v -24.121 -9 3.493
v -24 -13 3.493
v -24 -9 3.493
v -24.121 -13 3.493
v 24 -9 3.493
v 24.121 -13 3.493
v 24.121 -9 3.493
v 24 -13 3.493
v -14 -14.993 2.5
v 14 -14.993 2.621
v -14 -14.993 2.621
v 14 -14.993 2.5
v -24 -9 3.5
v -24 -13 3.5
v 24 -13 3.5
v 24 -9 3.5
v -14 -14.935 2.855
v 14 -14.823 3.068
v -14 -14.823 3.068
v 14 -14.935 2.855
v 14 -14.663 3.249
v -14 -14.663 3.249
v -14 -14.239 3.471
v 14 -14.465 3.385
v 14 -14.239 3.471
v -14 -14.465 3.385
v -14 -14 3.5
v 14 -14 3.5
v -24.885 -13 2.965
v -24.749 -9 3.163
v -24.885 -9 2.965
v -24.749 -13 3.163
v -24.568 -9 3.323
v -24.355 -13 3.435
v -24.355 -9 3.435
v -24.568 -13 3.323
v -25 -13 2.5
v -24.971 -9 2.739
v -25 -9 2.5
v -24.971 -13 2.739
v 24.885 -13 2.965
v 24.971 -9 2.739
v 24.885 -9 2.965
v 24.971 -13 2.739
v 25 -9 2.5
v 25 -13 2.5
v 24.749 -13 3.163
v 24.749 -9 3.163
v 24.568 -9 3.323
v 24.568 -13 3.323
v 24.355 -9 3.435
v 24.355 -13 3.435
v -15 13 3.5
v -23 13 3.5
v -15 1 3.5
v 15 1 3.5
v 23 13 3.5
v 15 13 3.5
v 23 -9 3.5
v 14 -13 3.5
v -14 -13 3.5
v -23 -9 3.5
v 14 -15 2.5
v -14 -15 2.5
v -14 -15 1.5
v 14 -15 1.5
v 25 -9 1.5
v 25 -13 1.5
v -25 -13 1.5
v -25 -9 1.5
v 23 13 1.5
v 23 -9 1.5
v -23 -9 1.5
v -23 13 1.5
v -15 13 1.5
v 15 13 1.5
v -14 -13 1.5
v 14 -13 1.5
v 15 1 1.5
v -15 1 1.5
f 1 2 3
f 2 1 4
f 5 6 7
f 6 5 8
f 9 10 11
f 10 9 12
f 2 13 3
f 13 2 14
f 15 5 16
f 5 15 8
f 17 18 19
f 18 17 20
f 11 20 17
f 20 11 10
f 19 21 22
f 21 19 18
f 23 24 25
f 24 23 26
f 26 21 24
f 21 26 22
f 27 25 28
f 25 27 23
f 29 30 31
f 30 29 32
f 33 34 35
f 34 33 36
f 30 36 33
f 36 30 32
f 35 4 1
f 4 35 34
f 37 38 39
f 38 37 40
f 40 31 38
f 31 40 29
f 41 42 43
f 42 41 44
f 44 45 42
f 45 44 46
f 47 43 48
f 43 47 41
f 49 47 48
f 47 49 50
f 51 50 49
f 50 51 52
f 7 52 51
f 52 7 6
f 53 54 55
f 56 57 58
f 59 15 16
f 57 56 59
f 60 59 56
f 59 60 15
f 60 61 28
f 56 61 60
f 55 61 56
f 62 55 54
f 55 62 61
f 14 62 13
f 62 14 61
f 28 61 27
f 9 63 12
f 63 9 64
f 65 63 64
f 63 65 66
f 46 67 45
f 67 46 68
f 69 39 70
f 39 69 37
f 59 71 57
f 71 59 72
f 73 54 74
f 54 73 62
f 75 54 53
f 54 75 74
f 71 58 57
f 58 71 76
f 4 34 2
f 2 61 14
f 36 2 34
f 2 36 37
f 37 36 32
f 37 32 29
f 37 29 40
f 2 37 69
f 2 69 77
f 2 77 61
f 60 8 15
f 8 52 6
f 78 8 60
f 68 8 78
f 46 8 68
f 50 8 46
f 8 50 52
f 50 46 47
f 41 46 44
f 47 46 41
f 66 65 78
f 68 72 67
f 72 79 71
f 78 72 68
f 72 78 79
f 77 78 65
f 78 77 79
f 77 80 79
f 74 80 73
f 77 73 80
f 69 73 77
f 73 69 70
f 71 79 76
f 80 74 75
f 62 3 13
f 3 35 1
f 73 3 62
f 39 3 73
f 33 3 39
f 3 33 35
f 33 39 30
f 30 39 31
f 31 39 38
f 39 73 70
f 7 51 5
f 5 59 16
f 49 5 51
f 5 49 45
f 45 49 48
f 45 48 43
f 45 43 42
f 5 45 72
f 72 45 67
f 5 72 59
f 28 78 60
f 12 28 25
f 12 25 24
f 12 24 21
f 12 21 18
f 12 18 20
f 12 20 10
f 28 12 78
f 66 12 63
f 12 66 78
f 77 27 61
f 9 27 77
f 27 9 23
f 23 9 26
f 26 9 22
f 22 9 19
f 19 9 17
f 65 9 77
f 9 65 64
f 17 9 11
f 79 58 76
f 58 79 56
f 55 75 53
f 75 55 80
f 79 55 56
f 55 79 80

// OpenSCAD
// file: holder_hole.scad
module holder_hole(
    width = 50,
    deep = 30,
    height = 7,
    wall = 2,
    hole_length = 20,
    cover_mortize_length = 4,
    gap = 5
){
    union(){
    
        translate([-width/2+wall+gap/2,-deep/2+wall+gap/2,-height/2+wall]){
            cube([width-2*wall-gap,deep-2*wall-gap,2*height],center=false);
        }
        
        translate([-hole_length/2+gap/2,-deep,-height/2+wall]){
            cube([hole_length-gap,deep,2*height],center=false);
        }
        
        translate([-width,-deep/2+wall+gap/2,height/2-wall]){
            cube([width*2,cover_mortize_length-gap,wall*2],center=false);
        }
        
        cvr_bottom_mortize_len = hole_length + cover_mortize_length*2;
        translate([-cvr_bottom_mortize_len/2+gap/2,-deep/2-wall/2,height/2-wall]){
            cube([cvr_bottom_mortize_len-gap,wall*2,wall*2],center=false);
        }
    }
}

holder_hole(gap=2);
%holder_hole(gap=0);
// file: round_cube.scad
module round_cube(sizes, radius){
    
    union(){
        for(xd = [-1,1]){
        for(yd = [-1,1]){
        for(zd = [-1,1]){
            translate([
                (sizes[0]/2 - radius)*xd,
                (sizes[1]/2 - radius)*yd,
                (sizes[2]/2 - radius)*zd]
            ){
                sphere(radius, $fs=0.25);
            }
        }}}
        cube([sizes[0]-radius*2,sizes[1]-radius*2,sizes[2]], center=true);
        cube([sizes[0]-radius*2,sizes[1],sizes[2]-radius*2], center=true);
        cube([sizes[0],sizes[1]-radius*2,sizes[2]-radius*2], center=true);
    
        for(d1 = [-1,1]){
        for(d2 = [-1,1]){        
            translate([
                (sizes[0]/2-radius)*d1,
                (sizes[1]/2-radius)*d2,
                0
            ]){
                cylinder(h=sizes[2]-radius*2, r=radius, center=true, $fs=0.25);
            }        
            translate([
                0,
                (sizes[1]/2-radius)*d1,
                (sizes[2]/2-radius)*d2            
            ]){
                rotate(a=[0,90,0]){
                    cylinder(h=sizes[0]-radius*2, r=radius, center=true, $fs=0.25);
                }    
            }        
            translate([
                (sizes[0]/2-radius)*d1,
                0,
                (sizes[2]/2-radius)*d2            
            ]){
                rotate(a=[90,0,0]){
                    cylinder(h=sizes[1]-radius*2, r=radius, center=true, $fs=0.25);
                }    
            }        
        }}
    }
}


module upround_cube(sizes, radius){
    
	intersection(){
	    union(){
	        for(xd = [-1,1]){
	        for(yd = [-1,1]){
	            translate([
	                (sizes[0]/2 - radius)*xd,
	                (sizes[1]/2 - radius)*yd,
	                (sizes[2]/2 - radius)*1]
	            ){
	                sphere(radius, $fs=0.5);
	            }
	        }}
        
	        cube([sizes[0]-radius*2,sizes[1]-radius*2,sizes[2]], center=true);
        
	        translate([0,0,-radius/2]){
	            cube([sizes[0]-radius*2,sizes[1],sizes[2]-radius], center=true);
	        }
	        translate([0,0,-radius/2]){
	            cube([sizes[0],sizes[1]-radius*2,sizes[2]-radius], center=true);
	        }
    
	        for(d1 = [-1,1]){
	        for(d2 = [-1,1]){        
	            translate([
	                (sizes[0]/2-radius)*d1,
	                (sizes[1]/2-radius)*d2,
	                -radius/2
	            ]){
	                cylinder(h=sizes[2]-radius, r=radius, center=true, $fs=0.5);
	            }        
	        }}

	        for(d1 = [-1,1]){
	            translate([
	                (sizes[0]/2-radius)*d1,
	                0,
	                (sizes[2]/2-radius)*1            
	            ]){
	                rotate(a=[90,0,0]){
	                    cylinder(h=sizes[1]-radius*2, r=radius, center=true, $fs=0.5);
	                }    
	            }
	            translate([
	                0,
	                (sizes[1]/2-radius)*d1,
	                (sizes[2]/2-radius)*1            
	            ]){
	                rotate(a=[0,90,0]){
	                    cylinder(h=sizes[0]-radius*2, r=radius, center=true, $fs=0.5);
	                }    
	            }        
                    
	        }
	    }
		cube(sizes,center=true);
	}
	
    
}

round_cube([30,50,7], radius = 1);

translate([40,0,0]){
    upround_cube([30,50,30], radius = 5);
}
// main file
use <round_cube.scad>;
use <holder_hole.scad>;

module cover(
    width = 50,
    deep = 30,
    height = 7,
    wall = 2,
    hole_length = 20,
    cover_mortize_length = 4,
    gap = 0,
    uphole_width = 30,
    uphole_deep = 12
){
    render(){    
        difference(){
            intersection(){
                round_cube([width,deep,height], radius = 1);
                
                translate([0,0,height-wall]){
                    cube([width*2,deep*2,height],center=true);
                }
                
                holder_hole(
                    width = width,
                    deep = deep,
                    height = height,
                    wall = wall,
                    hole_length = hole_length,
                    cover_mortize_length = cover_mortize_length,
                    gap = gap
                );
                
            }
            
            translate([0,deep/2-wall,height/2]){
                cube([uphole_width, uphole_deep*2, height],center=true);
            }
        }
    }    
        
}

cover();
